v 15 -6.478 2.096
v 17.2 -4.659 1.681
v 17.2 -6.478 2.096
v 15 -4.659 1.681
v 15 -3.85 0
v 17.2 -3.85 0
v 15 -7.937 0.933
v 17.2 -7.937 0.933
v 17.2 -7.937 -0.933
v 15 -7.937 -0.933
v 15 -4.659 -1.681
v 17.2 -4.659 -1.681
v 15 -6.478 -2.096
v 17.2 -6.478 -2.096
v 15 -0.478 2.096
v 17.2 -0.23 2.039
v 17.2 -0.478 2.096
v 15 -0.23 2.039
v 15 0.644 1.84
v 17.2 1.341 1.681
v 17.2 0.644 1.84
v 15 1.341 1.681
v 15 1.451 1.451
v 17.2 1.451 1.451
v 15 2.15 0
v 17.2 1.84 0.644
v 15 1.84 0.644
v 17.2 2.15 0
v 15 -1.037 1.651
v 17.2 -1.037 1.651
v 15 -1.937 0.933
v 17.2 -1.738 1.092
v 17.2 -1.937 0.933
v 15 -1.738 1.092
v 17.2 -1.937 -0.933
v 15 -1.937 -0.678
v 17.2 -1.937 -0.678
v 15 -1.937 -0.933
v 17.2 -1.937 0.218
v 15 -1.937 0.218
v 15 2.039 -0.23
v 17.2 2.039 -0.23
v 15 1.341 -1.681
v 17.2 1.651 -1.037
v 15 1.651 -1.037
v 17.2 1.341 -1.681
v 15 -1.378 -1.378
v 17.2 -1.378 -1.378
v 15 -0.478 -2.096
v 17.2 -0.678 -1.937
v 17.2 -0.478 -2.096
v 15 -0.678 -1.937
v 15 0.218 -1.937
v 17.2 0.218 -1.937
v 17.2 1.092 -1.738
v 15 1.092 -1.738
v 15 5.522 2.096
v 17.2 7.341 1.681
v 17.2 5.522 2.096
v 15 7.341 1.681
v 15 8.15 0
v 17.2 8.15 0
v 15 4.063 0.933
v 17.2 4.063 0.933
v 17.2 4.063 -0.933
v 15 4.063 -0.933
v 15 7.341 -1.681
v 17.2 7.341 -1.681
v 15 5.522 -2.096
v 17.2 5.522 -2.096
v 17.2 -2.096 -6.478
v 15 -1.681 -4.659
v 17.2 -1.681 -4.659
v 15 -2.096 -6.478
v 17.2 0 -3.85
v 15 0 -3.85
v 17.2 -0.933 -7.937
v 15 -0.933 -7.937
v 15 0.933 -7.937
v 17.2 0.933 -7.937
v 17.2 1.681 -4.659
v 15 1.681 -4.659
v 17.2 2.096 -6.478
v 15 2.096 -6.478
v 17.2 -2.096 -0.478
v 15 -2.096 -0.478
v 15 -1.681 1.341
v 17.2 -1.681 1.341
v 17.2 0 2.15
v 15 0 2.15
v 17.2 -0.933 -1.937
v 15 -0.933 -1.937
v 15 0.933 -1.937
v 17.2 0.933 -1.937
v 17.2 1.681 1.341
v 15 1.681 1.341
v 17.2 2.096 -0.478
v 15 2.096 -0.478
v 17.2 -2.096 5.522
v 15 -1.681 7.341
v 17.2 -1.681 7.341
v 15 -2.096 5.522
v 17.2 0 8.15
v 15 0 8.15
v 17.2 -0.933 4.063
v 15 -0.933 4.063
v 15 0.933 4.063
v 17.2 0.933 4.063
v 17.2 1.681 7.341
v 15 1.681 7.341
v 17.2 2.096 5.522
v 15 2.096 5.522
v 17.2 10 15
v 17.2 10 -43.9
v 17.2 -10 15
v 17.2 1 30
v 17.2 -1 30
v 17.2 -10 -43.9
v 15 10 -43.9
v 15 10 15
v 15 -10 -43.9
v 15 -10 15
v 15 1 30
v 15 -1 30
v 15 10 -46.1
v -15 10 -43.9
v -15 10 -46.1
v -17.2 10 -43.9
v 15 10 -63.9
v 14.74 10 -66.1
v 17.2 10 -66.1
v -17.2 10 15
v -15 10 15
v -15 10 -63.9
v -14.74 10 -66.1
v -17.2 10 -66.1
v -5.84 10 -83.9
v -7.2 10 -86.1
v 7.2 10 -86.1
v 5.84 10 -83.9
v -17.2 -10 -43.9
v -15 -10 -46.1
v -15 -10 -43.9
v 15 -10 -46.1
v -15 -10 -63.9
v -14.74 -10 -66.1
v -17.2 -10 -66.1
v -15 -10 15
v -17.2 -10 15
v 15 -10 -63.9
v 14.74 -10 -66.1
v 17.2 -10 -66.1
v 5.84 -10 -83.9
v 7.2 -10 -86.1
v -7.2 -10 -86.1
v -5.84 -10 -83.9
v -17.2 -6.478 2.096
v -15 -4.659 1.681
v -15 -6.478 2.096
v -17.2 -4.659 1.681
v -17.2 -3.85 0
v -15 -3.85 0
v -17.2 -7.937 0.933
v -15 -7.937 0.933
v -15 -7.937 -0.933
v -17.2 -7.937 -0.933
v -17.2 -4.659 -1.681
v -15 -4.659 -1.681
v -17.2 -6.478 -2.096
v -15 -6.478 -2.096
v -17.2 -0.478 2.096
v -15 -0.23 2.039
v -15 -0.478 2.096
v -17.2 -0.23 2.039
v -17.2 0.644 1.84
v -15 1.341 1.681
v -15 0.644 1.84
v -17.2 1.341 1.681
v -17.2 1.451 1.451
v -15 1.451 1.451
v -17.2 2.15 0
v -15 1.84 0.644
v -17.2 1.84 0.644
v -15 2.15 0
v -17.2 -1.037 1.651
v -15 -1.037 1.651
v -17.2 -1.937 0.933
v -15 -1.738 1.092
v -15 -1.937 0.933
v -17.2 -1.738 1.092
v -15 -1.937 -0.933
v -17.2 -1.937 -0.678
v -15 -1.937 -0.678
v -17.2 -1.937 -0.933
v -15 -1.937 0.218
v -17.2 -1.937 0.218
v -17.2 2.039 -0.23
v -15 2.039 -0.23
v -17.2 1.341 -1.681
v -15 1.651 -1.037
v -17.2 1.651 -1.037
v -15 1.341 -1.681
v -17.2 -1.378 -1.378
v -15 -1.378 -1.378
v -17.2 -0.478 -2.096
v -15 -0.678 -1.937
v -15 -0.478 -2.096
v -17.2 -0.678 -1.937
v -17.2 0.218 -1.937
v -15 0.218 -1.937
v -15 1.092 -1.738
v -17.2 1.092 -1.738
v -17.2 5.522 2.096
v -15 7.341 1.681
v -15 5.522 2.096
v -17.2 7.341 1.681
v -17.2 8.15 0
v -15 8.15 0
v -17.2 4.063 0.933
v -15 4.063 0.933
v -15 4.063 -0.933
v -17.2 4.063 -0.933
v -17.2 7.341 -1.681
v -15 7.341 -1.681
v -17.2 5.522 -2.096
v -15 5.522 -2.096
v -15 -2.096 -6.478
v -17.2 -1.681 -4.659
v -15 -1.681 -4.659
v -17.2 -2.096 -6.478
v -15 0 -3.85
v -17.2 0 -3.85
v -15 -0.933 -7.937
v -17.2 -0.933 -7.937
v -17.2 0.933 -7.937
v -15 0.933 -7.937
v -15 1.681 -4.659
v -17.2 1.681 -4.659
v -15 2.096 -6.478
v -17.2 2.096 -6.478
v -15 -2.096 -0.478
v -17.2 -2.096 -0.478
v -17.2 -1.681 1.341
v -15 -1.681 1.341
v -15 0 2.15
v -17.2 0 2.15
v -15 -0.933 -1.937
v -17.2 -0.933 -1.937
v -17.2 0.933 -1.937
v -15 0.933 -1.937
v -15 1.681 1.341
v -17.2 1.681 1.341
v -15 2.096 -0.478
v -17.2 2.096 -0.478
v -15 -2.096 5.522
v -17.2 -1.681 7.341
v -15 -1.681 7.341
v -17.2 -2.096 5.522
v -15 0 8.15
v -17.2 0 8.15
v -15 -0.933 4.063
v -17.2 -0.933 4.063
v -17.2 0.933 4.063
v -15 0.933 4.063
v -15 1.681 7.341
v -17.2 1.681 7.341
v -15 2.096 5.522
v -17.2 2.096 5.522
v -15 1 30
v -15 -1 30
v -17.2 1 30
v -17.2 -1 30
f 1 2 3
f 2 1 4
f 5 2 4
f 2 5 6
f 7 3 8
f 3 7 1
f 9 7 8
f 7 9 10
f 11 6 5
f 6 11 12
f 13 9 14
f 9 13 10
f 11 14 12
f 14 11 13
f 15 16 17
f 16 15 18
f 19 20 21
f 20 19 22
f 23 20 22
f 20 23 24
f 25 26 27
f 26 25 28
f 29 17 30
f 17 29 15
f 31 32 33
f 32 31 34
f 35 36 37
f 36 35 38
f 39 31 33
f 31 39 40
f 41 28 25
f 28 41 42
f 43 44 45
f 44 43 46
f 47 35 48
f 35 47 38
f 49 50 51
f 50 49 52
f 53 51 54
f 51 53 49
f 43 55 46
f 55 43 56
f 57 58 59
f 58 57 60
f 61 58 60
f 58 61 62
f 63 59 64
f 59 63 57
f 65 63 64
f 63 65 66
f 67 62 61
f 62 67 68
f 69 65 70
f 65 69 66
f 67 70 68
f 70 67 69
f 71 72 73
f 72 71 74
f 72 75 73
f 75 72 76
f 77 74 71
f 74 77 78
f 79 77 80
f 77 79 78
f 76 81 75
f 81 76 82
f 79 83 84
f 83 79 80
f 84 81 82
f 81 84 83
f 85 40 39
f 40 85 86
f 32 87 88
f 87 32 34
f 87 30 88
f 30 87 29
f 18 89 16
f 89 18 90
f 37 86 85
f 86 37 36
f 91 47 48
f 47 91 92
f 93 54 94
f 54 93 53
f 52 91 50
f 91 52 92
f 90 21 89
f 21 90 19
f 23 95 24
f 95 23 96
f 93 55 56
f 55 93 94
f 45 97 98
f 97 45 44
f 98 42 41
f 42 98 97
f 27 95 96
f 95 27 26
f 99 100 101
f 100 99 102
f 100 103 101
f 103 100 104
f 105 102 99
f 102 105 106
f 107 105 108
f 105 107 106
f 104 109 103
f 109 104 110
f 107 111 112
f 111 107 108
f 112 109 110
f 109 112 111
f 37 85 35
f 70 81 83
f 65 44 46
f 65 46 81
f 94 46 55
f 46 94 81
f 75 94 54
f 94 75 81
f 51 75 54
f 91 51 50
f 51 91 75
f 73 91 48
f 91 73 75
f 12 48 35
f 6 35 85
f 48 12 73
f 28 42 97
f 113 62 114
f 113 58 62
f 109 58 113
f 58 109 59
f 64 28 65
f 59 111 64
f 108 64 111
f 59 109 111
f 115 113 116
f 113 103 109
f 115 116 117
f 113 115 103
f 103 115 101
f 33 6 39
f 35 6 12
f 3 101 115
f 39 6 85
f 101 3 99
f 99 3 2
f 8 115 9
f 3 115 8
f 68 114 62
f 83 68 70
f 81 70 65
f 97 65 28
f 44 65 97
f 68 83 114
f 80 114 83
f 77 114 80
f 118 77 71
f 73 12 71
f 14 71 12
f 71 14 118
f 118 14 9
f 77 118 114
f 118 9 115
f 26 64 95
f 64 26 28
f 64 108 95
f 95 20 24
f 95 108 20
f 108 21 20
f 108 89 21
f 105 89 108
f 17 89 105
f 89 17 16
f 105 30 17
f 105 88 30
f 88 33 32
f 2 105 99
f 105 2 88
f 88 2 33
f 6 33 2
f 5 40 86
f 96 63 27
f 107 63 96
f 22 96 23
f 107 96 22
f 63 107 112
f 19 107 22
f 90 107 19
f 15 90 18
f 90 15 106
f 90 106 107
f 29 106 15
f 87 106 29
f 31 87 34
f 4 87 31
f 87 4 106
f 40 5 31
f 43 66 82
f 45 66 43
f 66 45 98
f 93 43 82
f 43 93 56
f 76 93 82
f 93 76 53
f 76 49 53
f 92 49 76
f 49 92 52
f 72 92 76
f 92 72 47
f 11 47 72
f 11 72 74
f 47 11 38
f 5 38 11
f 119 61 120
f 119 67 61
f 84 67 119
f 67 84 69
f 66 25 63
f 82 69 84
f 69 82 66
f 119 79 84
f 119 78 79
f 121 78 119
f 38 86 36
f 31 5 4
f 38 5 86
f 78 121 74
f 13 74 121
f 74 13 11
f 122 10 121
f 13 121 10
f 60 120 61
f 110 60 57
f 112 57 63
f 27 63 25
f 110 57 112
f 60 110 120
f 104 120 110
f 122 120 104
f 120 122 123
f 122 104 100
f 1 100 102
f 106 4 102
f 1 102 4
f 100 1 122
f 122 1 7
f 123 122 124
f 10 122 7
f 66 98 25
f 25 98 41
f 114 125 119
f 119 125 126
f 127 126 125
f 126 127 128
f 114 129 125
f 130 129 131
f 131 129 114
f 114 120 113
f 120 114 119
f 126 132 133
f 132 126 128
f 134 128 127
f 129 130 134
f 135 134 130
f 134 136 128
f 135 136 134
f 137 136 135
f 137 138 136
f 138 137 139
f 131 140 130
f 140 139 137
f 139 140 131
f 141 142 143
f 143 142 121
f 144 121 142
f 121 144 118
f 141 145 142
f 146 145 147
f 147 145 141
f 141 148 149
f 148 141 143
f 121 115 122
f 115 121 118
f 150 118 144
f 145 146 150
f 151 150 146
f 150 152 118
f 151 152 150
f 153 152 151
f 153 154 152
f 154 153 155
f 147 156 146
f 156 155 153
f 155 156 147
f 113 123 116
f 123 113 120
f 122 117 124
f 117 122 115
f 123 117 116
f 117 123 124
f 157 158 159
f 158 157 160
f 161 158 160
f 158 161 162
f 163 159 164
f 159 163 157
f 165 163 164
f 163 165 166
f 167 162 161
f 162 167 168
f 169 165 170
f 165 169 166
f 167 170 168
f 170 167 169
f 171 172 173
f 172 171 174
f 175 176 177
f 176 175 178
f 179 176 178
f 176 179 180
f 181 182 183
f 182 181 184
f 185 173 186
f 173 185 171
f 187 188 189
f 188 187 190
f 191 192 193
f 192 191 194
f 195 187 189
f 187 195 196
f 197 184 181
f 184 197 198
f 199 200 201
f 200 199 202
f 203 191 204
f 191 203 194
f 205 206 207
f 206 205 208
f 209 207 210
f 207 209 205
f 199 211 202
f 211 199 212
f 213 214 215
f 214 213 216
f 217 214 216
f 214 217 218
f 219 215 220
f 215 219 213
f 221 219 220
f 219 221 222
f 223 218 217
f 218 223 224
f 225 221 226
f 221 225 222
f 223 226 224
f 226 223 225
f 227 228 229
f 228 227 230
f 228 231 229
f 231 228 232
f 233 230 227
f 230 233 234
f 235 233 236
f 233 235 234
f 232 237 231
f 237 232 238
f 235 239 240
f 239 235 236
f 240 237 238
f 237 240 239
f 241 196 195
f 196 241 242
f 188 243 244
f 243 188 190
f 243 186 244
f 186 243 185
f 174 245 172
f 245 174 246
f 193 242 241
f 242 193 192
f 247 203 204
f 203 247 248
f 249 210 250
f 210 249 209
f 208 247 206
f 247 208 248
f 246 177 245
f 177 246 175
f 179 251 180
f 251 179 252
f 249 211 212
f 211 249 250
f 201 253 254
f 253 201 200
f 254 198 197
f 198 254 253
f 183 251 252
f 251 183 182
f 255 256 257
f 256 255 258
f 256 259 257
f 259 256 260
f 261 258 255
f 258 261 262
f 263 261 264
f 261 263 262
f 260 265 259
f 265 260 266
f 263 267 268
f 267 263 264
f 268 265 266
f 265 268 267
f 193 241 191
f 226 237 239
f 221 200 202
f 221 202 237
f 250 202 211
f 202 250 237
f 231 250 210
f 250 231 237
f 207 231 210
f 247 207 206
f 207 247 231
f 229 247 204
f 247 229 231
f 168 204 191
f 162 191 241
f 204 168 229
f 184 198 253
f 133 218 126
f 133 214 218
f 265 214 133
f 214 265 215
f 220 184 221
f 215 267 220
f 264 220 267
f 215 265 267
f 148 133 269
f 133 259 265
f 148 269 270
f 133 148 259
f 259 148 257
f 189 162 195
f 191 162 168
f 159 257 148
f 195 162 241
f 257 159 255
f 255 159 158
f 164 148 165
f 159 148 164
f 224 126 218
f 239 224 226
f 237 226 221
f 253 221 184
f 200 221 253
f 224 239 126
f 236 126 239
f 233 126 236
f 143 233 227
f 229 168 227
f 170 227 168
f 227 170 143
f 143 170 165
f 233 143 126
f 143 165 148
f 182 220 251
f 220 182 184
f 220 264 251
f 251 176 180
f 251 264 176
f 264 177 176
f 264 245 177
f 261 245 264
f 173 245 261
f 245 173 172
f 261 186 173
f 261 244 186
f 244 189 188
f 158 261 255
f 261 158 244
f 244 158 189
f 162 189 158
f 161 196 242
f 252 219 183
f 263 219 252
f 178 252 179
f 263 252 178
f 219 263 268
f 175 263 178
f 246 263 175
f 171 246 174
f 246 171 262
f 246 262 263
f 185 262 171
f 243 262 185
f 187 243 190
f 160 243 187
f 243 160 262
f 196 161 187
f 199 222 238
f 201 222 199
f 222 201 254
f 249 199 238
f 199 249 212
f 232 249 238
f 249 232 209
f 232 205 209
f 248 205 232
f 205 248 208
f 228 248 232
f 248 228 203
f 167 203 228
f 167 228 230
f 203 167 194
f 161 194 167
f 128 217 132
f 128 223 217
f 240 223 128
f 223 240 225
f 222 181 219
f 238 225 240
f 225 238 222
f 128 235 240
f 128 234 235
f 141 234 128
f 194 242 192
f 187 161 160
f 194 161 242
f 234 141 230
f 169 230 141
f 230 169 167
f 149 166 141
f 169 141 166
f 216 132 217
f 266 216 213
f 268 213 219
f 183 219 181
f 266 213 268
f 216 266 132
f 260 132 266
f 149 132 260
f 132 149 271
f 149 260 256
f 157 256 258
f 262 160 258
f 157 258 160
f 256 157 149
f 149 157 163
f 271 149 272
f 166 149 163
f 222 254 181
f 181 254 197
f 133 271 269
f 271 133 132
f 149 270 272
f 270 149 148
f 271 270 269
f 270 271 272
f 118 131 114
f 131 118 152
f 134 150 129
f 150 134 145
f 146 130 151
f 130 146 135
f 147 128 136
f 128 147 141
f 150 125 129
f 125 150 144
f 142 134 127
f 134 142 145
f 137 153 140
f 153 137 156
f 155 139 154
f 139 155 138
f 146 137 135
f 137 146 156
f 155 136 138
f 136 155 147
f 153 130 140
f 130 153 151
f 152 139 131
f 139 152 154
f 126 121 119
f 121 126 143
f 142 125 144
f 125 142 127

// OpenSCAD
// file: ../util/rounded.scad
Collisions=false;

// Do a rounded cube
module rounded(x=10, y=10, z=10, r=3, center=false) {
    if (Collisions) {
        translate([0,0,center?(z/2):0])
            cube([x,y,z], center=center);
    } else {
        if (center) {
            translate([-(x/2),-(y/2),0])
                rounded(x, y, z, r);
        } else {
            translate([r,r,0])
                minkowski() {
                    cube([x-2*r,y-2*r,z/2]);
                    cylinder(h=z/2, r=r);
                }
        }
    }
}
// file: ../models/ollo.scad
Collisions=false;

// Diameter of plastic ollo holes
OlloHoles = 4.3;

// Width of Ollo "real" plastic
OlloWidth = 3;

// Distance between two ollo holes
OlloSpacing = 6;

// Do an Ollo hole on the part
module olloHole(depth=2.2)
{
    if (!Collisions) {
        //:BOM "Ollo rivet" 0.05 http://www.robotis-shop-en.com/?act=shop_en.goods_view&GS=1605
        translate([0,0,-0.1])
            cylinder(depth+0.2, OlloHoles/2, OlloHoles/2);
    }	    
}

// Do 3 ollo holes
module threeOllo(depth=2.2)
{
    for (xy=[[-OlloSpacing,0],[0,0],[OlloSpacing,0]]) {
        translate([xy[0], xy[1], 0])
            olloHole(depth);
    }
}

// Do a servo arm holes
module servoArm(depth=2.2)
{
    threeOllo(depth);
    rotate([0,0,90])
        threeOllo(depth);
}
// main file
Collisions=false;
use <../models/ollo.scad>;
use <../util/rounded.scad>;

//:Part
module leg(sizeA=60, sizeB=20, sizeC=20, sizeBottom=10,
        sizeTop=15, mode="arm", fixationAngle=0, thickness=2.2, print=false)
{
    xOffset = (mode == "side") ? -10 : 0;
    spacing = (mode == "side") ? 24 : 30;

    module legSide()
    {
        difference() {
            union() {
                translate([0,0,sizeA/2])
                    rotate([0,90,0]) {
                        cube([sizeA, 20, thickness], center=true);
                        if (mode == "side") {
                            translate([15-sizeA/2, 10, -thickness/2])
                                rotate([0,0,+fixationAngle])
                                rounded(25,10,thickness, center=true);
                        }
                    }
            }
            translate([-thickness, 0, sizeA-15]) {
                rotate([90,0,90]) {
                    if (mode == "arm") {
                        servoArm(2*thickness);
                    }
                }
                if (mode == "side") {
                    translate([0,10,0])
                        rotate([90,90-fixationAngle,90])
                        threeOllo(2*thickness);
                }
            }
        }
	if (Collisions) {
		translate([0,0,sizeA+sizeTop-10]) {
			rotate([45,0,0])
			rotate([0,-90,0])
			cube([14,14,thickness],center=true);
		}
	} else {
		translate([-thickness/2,0,sizeA]) {
		    rotate([90,0,90])
			linear_extrude(thickness)
			polygon([[-10,0],[-1,sizeTop],[1,sizeTop],[10,0]]);
		}
	}
    }

    module biais() {
        Dx = (spacing-sizeBottom)/2;
        Dy = sizeC;
        Dl = sqrt(pow(Dx,2)+pow(Dy,2));

        translate([-(spacing/2)-thickness,-10,-(sizeB+thickness/2)])
            rotate([0,atan2(Dy,Dx),0])
            cube([Dl,20,thickness]);
    }

    if (print) {
        translate([0,0,10-xOffset])
            rotate([90,0,0])
            leg(sizeA, sizeB, sizeC, sizeBottom,
                    sizeTop, mode, fixationAngle, thickness, false);
    } else {
        translate([0,xOffset,-sizeA+15]) {
            cube([spacing+thickness*2, 20, thickness], center=true);

            translate([spacing/2+thickness/2,0,0])
                legSide();
            translate([-(spacing/2+thickness/2),0,0])
                legSide();

		if (!Collisions) {
		    translate([0,0,-sizeB])
			cube([spacing+thickness*2, 20, thickness], center=true);
		    translate([spacing/2+thickness/2,0,-sizeB/2])
			cube([thickness,20,sizeB], center=true);
		    translate([-(spacing/2+thickness/2),0,-sizeB/2])
			cube([thickness,20,sizeB], center=true);

		    translate([0,0,-(sizeB+sizeC)])
			cube([sizeBottom+thickness*2, 20, thickness], center=true);

		    biais();
		    mirror([1,0,0])
			biais();
		} else {
		    translate([0,0,-(sizeB+sizeC+thickness)+20])
			sphere(20);  
		}
        }
    }
}

leg();
